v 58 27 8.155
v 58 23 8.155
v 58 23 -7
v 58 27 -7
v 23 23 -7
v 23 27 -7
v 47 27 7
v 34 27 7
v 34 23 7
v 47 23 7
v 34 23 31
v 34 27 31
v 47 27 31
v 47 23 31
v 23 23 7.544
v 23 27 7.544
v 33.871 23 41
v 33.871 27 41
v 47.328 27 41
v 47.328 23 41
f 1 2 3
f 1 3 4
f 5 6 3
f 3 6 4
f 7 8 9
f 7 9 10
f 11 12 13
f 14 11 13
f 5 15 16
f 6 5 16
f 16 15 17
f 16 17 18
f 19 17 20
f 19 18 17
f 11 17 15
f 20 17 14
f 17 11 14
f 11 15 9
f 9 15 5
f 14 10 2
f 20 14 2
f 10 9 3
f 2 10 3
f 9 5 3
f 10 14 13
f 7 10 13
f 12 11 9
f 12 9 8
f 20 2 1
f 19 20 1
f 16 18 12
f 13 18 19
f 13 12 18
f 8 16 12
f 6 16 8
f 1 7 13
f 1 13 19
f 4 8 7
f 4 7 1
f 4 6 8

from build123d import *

# Parameters (mm, degrees)
BOX018_W               = 16
BOX018_H               = 4
BOX018_DEPTH           = 43
BOX018_PLACEMENT_ANGLE = 18
BOX017_W               = 16
BOX017_H               = 4
BOX017_DEPTH           = 43
BOX017_PLACEMENT_ANGLE = 18
BOX014_W               = 11
BOX014_H               = 4
BOX014_DEPTH           = 34
BOX015_W               = 11
BOX015_H               = 4
BOX015_DEPTH           = 34
BOX016_W               = 13
BOX016_H               = 4
BOX016_DEPTH           = 10
BOX013_W               = 35
BOX013_H               = 4
BOX013_DEPTH           = 14


with BuildPart() as w_rfel018:
    # Box018 → Box018 (new body)
    with BuildSketch(Plane.XY):
        with Locations((8, 2)):
            Rectangle(BOX018_W, BOX018_H)
    extrude(amount=BOX018_DEPTH)


with BuildPart() as w_rfel018_1:
    # Box018 placement: moved
    add(w_rfel018.part.moved(Location((39, 0, 9))).rotate(Axis((39, 0, 9), (0, -1, 0)), BOX018_PLACEMENT_ANGLE))


with BuildPart() as fusion010:
    # Box017 → Box017 (new body)
    with BuildSketch(Plane.XY):
        with Locations((8, 2)):
            Rectangle(BOX017_W, BOX017_H)
    extrude(amount=BOX017_DEPTH)


with BuildPart() as fusion010_1:
    # Box017 placement: moved
    add(fusion010.part.moved(Location((-15, 0, 14))).rotate(Axis((-15, 0, 14), (0, 1, 0)), BOX017_PLACEMENT_ANGLE))

    # Fusion010: union Würfel018
    add(w_rfel018_1.part)


with BuildPart() as w_rfel014:
    # Box014 → Box014 (new body)
    with BuildSketch(Plane(origin=(2, 0, 14), x_dir=(1, 0, 0), z_dir=(0, 0, 1))):
        with Locations((5.5, 2)):
            Rectangle(BOX014_W, BOX014_H)
    extrude(amount=BOX014_DEPTH)


with BuildPart() as w_rfel015:
    # Box015 → Box015 (new body)
    with BuildSketch(Plane(origin=(26, 0, 14), x_dir=(1, 0, 0), z_dir=(0, 0, 1))):
        with Locations((5.5, 2)):
            Rectangle(BOX015_W, BOX015_H)
    extrude(amount=BOX015_DEPTH)


with BuildPart() as w_rfel016:
    # Box016 → Box016 (new body)
    with BuildSketch(Plane(origin=(13, 0, 38), x_dir=(1, 0, 0), z_dir=(0, 0, 1))):
        with Locations((6.5, 2)):
            Rectangle(BOX016_W, BOX016_H)
    extrude(amount=BOX016_DEPTH)


with BuildPart() as cut004:
    # Box013 → Box013 (new body)
    with BuildSketch(Plane(origin=(2, 0, 0), x_dir=(1, 0, 0), z_dir=(0, 0, 1))):
        with Locations((17.5, 2)):
            Rectangle(BOX013_W, BOX013_H)
    extrude(amount=BOX013_DEPTH)

    # Fusion009: union Würfel014, Würfel015, Würfel016
    add(w_rfel014.part)
    add(w_rfel015.part)
    add(w_rfel016.part)

    # Cut004: cut Fusion010
    add(fusion010_1.part, mode=Mode.SUBTRACT)


with BuildPart() as cut004_1:
    # Cut004 placement: moved
    add(cut004.part.moved(Location((21, 23, -7))))


solid = cut004_1.part
